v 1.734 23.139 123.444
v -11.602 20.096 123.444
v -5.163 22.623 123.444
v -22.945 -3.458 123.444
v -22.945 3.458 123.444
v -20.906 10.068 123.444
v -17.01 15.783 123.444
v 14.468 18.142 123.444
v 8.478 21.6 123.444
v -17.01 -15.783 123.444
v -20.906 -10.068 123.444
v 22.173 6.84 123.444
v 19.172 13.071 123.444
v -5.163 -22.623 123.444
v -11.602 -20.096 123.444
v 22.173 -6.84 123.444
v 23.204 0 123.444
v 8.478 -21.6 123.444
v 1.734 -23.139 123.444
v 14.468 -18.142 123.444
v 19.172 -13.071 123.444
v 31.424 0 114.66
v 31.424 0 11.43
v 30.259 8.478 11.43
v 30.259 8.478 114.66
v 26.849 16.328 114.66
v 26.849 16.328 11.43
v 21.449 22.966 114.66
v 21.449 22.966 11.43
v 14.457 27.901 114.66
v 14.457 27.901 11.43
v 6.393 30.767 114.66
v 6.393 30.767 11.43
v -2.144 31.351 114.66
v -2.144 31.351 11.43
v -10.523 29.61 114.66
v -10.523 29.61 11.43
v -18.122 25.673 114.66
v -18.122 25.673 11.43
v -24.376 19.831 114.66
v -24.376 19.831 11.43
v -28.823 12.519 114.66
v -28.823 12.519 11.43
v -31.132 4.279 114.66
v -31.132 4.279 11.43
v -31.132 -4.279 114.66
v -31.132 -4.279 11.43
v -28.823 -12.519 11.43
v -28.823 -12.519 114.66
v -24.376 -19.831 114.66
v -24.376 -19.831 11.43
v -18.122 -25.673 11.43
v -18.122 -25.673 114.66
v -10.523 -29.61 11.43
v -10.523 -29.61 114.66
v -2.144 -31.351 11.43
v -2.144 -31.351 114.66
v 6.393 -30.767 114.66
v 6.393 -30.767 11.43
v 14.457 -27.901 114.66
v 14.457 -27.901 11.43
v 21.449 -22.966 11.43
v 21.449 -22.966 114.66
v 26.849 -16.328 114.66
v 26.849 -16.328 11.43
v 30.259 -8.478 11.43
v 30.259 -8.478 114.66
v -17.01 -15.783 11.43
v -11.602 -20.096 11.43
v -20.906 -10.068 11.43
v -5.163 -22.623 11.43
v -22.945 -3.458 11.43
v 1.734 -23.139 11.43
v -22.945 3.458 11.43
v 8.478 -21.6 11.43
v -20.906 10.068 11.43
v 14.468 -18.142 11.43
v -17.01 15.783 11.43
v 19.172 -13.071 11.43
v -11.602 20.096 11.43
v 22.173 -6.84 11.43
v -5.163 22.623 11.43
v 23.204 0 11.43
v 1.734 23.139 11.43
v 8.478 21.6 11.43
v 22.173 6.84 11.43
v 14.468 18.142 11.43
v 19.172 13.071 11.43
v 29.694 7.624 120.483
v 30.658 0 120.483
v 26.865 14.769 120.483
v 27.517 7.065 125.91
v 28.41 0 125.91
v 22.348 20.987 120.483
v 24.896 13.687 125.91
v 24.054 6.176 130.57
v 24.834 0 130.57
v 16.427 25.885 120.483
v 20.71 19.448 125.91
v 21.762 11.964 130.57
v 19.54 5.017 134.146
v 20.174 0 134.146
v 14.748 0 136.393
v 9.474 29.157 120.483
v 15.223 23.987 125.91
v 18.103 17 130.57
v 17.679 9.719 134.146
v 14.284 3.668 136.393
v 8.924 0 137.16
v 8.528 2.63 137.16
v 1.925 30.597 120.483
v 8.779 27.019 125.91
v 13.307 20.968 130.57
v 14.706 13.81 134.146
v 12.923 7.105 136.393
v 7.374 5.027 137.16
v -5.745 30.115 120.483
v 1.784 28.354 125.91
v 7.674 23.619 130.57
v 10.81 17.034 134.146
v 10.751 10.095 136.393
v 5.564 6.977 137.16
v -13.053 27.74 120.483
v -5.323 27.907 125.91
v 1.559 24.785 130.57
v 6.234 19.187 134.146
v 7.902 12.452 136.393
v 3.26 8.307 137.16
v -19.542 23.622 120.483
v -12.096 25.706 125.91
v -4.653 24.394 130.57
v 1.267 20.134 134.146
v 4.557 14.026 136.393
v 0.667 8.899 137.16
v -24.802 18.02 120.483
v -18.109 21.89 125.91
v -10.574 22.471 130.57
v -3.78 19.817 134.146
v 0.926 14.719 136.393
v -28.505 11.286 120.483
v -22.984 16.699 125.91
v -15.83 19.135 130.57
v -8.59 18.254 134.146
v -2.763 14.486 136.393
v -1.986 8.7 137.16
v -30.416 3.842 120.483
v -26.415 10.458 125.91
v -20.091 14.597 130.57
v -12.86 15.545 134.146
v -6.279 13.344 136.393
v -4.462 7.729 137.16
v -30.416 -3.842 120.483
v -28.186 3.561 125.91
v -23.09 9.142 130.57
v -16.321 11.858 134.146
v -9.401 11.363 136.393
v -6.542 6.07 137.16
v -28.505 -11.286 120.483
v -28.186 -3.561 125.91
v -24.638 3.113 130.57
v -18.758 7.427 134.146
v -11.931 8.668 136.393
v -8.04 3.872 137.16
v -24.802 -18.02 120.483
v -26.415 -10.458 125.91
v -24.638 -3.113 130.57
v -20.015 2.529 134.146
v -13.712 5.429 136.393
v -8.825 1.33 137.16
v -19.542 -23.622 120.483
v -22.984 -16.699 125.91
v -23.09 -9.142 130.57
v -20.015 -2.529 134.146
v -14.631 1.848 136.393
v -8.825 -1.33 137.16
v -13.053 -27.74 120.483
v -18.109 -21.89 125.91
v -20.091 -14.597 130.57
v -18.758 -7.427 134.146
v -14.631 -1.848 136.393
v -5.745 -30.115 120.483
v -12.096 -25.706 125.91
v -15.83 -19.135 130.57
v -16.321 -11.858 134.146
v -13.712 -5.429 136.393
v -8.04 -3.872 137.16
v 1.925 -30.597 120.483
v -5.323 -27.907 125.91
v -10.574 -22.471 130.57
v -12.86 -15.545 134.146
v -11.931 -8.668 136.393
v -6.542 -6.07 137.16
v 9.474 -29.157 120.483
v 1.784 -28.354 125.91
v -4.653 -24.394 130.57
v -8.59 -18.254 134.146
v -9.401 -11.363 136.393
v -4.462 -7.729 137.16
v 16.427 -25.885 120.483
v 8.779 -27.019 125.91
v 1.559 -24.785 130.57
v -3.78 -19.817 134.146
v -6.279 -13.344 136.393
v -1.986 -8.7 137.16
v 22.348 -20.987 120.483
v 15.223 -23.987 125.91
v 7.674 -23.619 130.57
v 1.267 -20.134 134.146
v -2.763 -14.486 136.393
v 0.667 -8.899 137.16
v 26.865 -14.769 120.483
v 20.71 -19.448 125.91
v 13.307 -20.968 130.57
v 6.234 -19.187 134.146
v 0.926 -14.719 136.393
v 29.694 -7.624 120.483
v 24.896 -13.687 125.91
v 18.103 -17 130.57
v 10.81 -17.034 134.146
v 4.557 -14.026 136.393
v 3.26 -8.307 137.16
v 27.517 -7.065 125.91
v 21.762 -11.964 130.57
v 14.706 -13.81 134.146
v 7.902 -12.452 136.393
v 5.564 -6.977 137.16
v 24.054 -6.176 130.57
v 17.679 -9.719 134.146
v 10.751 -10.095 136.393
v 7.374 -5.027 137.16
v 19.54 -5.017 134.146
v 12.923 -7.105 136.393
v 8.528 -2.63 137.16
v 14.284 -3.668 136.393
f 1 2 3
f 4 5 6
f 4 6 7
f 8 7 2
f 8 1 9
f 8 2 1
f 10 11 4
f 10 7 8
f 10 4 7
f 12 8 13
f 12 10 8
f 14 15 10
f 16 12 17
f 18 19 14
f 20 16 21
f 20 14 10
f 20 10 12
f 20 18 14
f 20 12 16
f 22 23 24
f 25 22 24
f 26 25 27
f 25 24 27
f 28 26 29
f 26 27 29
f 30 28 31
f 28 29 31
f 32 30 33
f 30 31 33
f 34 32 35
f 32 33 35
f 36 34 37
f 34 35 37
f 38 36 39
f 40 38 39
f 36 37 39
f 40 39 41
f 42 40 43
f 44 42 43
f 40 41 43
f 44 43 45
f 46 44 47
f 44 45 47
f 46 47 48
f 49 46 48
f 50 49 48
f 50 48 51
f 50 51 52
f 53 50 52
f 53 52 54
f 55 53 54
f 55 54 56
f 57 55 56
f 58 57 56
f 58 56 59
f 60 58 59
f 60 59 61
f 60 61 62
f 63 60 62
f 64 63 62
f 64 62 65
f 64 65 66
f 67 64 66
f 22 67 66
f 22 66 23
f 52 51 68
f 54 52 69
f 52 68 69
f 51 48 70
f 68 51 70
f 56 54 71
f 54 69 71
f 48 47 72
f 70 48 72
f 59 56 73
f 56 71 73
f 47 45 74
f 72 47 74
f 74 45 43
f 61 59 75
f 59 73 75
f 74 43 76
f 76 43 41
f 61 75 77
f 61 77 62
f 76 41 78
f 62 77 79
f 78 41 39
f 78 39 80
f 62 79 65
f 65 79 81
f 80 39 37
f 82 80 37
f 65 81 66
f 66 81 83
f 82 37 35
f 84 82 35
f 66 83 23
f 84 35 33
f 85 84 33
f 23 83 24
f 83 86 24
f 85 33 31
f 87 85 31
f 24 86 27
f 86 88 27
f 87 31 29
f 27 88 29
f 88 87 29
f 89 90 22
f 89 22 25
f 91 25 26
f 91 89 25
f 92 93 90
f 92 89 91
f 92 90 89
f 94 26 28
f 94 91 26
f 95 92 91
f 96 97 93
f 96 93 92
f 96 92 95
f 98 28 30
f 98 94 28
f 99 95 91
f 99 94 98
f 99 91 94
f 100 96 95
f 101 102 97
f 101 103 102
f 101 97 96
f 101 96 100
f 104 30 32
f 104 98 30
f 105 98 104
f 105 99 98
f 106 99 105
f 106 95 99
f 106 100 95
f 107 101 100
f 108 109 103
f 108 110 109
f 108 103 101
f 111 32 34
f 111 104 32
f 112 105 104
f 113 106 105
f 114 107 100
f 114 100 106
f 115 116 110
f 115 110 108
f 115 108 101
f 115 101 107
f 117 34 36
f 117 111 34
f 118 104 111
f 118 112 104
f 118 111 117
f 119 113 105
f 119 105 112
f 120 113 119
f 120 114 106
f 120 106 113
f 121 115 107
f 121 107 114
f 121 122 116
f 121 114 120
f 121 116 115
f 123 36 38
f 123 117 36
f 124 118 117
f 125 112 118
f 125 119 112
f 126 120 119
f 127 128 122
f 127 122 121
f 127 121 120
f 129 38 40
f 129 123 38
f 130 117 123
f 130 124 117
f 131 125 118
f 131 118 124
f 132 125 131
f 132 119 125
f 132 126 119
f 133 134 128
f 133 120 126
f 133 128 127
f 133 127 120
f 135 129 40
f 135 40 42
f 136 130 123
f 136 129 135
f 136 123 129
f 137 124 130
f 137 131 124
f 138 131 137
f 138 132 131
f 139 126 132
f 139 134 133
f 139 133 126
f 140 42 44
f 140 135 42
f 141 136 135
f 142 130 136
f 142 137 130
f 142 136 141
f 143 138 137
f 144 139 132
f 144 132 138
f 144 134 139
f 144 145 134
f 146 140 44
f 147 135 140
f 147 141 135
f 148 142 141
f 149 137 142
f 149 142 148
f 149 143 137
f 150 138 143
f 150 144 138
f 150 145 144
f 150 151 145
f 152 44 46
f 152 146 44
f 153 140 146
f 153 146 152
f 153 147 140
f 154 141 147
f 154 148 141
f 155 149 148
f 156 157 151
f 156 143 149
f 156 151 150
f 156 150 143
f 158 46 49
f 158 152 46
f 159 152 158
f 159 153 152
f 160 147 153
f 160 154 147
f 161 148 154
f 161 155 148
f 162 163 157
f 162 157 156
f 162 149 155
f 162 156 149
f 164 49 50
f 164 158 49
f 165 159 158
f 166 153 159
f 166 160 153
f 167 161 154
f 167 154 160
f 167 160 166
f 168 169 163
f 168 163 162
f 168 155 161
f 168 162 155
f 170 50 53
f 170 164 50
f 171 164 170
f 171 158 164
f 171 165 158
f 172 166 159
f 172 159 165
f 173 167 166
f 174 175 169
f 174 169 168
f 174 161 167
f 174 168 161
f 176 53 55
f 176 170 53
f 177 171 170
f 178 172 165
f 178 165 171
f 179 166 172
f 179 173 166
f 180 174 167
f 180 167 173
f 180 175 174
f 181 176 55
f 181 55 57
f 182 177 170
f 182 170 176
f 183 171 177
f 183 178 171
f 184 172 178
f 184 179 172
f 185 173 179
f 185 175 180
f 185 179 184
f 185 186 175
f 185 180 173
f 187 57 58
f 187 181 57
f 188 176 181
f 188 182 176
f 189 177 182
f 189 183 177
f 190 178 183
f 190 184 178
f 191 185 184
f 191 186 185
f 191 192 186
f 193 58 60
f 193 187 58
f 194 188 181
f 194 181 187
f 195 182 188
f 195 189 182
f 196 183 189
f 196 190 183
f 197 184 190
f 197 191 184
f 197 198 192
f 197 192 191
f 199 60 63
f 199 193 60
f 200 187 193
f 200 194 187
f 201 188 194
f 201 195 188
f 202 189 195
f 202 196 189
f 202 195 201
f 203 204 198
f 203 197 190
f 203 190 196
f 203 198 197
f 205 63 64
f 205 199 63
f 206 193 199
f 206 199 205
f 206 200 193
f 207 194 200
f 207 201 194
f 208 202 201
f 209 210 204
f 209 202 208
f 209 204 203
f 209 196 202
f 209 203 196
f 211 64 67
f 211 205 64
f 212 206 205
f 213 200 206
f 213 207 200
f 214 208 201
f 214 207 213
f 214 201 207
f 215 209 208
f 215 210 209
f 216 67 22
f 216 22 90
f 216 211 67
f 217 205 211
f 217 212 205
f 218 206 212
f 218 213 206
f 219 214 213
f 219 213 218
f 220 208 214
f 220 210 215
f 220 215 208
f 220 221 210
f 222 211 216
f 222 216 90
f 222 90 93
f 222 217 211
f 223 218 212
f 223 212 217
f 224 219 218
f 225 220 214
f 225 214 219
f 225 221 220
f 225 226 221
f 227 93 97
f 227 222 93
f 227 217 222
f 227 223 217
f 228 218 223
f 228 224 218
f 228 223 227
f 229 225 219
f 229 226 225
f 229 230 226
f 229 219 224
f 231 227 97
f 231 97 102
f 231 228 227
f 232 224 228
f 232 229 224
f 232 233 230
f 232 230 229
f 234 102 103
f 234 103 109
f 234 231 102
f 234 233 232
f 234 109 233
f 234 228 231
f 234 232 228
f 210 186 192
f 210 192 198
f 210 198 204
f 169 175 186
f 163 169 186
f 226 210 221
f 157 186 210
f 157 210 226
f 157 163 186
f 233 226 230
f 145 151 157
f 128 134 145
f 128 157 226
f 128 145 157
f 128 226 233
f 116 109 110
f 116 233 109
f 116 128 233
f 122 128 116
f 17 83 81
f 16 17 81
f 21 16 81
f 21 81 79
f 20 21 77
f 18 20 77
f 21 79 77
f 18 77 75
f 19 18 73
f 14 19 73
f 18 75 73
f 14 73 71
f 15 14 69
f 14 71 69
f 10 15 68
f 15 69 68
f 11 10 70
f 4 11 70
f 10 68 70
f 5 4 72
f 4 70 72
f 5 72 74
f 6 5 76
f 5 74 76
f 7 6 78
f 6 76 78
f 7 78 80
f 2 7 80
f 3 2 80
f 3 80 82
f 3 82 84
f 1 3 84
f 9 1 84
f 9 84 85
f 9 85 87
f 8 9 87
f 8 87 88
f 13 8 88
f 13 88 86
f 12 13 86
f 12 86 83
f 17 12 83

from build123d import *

# Parameters (mm, degrees)
F0_R     = 34.9158107131
F1_DEPTH = 152.4
F2_R     = 25
F3_R     = 25.7826386029
F4_DEPTH = 137.16
F5_DEPTH = 12.7
F6_SCALE = 0.9


with BuildPart() as f1:
    # F0 (on Top) → F1 (new body)
    with BuildSketch(Plane.XY):
        Circle(F0_R)
    extrude(amount=F1_DEPTH)

    # F2
    f2_edges = [f1.edges().sort_by_distance(p)[0] for p in [
        (-34.915811, 0, 152.4),
    ]]
    fillet(f2_edges, radius=F2_R)

    # F3 (on face) → F4 (cut)
    with BuildSketch(Plane(origin=(0, 0, 0), x_dir=(1, 0, 0), z_dir=(0, 0, -1))):
        Circle(F3_R)
    extrude(amount=-F4_DEPTH, mode=Mode.SUBTRACT)

    # F5 (cut): a face of the model
    f5_faces = [f1.faces().sort_by_distance(p)[0] for p in [
        (-33.9282424521, 0, 0),
    ]]
    extrude(f5_faces, amount=-F5_DEPTH, mode=Mode.SUBTRACT)


with BuildPart() as f1_1:
    # F6: moved
    add(f1.part.scale(F6_SCALE))


solid = f1_1.part
